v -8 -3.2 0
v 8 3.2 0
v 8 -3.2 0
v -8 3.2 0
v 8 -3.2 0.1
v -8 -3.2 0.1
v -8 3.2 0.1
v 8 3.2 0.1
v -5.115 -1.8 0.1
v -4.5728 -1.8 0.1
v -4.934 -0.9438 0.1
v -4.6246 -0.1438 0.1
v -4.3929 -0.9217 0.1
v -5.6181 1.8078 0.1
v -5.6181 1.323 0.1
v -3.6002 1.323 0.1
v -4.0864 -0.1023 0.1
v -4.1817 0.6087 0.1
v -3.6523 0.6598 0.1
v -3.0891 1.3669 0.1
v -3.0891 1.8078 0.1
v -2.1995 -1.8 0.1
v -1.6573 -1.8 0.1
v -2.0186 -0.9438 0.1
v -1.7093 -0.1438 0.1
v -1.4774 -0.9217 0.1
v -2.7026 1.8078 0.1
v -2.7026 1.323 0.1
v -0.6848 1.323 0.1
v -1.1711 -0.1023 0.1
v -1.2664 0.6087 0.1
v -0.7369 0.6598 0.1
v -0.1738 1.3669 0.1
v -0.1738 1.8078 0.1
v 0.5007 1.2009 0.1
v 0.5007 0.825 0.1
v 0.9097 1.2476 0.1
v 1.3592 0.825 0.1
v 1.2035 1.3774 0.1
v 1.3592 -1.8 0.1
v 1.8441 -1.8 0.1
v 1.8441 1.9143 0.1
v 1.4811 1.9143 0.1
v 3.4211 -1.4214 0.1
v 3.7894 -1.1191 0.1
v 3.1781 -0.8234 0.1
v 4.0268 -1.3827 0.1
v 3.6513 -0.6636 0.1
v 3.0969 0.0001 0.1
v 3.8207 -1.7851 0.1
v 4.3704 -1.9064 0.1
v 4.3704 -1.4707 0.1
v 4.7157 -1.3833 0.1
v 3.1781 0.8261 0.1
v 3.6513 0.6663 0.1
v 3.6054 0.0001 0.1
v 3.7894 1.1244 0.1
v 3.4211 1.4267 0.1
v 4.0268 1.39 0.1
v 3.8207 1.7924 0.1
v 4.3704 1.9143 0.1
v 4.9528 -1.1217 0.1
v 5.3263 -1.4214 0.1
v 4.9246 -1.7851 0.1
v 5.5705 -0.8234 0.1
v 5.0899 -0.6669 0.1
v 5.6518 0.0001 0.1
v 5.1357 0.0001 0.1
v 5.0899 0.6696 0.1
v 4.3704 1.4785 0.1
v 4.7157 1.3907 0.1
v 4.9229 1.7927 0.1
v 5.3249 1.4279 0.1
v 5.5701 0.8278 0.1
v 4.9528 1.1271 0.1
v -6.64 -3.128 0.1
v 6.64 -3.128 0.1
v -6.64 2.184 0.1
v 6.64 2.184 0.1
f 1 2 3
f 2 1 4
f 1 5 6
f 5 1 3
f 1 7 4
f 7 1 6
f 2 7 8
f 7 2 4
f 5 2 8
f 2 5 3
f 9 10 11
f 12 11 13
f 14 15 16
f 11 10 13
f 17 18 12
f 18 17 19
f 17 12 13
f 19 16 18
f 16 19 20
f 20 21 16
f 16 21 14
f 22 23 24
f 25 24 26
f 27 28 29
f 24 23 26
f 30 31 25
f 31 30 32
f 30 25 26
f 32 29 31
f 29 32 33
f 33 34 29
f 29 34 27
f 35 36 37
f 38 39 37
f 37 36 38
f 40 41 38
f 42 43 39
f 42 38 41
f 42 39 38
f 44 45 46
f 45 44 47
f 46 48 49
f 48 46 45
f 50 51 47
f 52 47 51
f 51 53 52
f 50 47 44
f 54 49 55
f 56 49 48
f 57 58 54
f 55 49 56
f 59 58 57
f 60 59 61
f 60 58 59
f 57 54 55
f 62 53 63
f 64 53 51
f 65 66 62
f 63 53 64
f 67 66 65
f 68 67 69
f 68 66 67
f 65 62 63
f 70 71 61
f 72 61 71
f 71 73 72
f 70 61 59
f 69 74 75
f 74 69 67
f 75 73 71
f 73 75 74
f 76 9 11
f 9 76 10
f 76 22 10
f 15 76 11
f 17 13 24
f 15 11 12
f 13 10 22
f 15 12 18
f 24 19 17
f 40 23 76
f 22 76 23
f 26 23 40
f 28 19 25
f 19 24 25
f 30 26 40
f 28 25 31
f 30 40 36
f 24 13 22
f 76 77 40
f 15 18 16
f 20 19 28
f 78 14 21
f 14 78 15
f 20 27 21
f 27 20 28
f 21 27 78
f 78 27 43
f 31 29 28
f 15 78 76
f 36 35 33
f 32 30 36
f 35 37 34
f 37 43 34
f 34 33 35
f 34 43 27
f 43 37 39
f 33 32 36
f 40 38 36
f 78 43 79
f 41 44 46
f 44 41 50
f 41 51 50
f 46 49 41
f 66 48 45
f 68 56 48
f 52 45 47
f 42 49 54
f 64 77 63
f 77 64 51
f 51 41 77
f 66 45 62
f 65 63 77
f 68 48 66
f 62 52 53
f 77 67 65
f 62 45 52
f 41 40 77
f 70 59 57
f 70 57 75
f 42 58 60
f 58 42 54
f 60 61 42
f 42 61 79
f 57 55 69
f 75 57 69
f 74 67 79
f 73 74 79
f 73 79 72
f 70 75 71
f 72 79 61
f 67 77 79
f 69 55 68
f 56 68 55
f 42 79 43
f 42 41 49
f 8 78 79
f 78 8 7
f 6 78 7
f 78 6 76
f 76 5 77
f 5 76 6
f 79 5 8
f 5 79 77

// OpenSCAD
// file: ../p/box5-12.scad
use <../lib.scad>
function ldraw_lib__box5_12() = [
// 0 Box with 5 Faces without Any Edges
// 0 Name: box5-12.dat
// 0 Author: Chris Dee [cwdee]
// 0 !LDRAW_ORG Primitive UPDATE 2009-02
// 0 !LICENSE Licensed under CC BY 2.0 and CC BY 4.0 : see CAreadme.txt
// 
// 0 BFC CERTIFY CCW
  [0,"BFC","CERTIFY"],
  [0,"BFC","CCW"],
// 
// 0 !HISTORY 2009-09-03 [PTadmin] Official Update 2009-02
// 
// 
// 4 16 1 1 1 1 1 -1 -1 1 -1 -1 1 1
  [4,16,1,1,1,1,1,-1,-1,1,-1,-1,1,1],
// 4 16 -1 0 1 1 0 1 1 1 1 -1 1 1
  [4,16,-1,0,1,1,0,1,1,1,1,-1,1,1],
// 4 16 -1 0 -1 -1 0 1 -1 1 1 -1 1 -1
  [4,16,-1,0,-1,-1,0,1,-1,1,1,-1,1,-1],
// 4 16 1 0 -1 -1 0 -1 -1 1 -1 1 1 -1
  [4,16,1,0,-1,-1,0,-1,-1,1,-1,1,1,-1],
// 4 16 1 0 1 1 0 -1 1 1 -1 1 1 1
  [4,16,1,0,1,1,0,-1,1,1,-1,1,1,1],
// 0
];
makepoly(ldraw_lib__box5_12(), line=0.2);
// main file
use <../lib.scad>
use <../p/box5-12.scad>
use <s/191888s01.scad>
function ldraw_lib__191888b() = [
// 0 Sticker  0.8 x  2 with White "7710"
// 0 Name: 191888b.dat
// 0 Author: Steffen [Steffen]
// 0 !LDRAW_ORG Part UPDATE 2012-01
// 0 !LICENSE Licensed under CC BY 2.0 and CC BY 4.0 : see CAreadme.txt
// 
// 0 BFC CERTIFY CCW
  [0,"BFC","CERTIFY"],
  [0,"BFC","CCW"],
// 
// 0 !HISTORY 2012-03-30 [PTadmin] Official Update 2012-01
// 
// 
// 1 16 0 -0.25 0 20 0 0 0 0.25 0 0 0 -8 box5-12.dat
  [1,16,0,-0.25,0,20,0,0,0,0.25,0,0,0,-8, ldraw_lib__box5_12()],
// 1 16 0 -0.25 -4.5 0.415 0 0 0 1 0 0 0 0.415 s\191888s01.dat
  [1,16,0,-0.25,-4.5,0.415,0,0,0,1,0,0,0,0.415, ldraw_lib__s__191888s01()],
// 4 16 -20 -0.25 8 -16.6 -0.25 5.46 16.6 -0.25 5.46 20 -0.25 8
  [4,16,-20,-0.25,8,-16.6,-0.25,5.46,16.6,-0.25,5.46,20,-0.25,8],
// 4 16 -16.6 -0.25 5.46 -20 -0.25 8 -20 -0.25 -8 -16.6 -0.25 -7.82
  [4,16,-16.6,-0.25,5.46,-20,-0.25,8,-20,-0.25,-8,-16.6,-0.25,-7.82],
// 4 16 -16.6 -0.25 -7.82 -20 -0.25 -8 20 -0.25 -8 16.6 -0.25 -7.82
  [4,16,-16.6,-0.25,-7.82,-20,-0.25,-8,20,-0.25,-8,16.6,-0.25,-7.82],
// 4 16 20 -0.25 8 16.6 -0.25 5.46 16.6 -0.25 -7.82 20 -0.25 -8
  [4,16,20,-0.25,8,16.6,-0.25,5.46,16.6,-0.25,-7.82,20,-0.25,-8],
];
makepoly(ldraw_lib__191888b(), line=0.2);
